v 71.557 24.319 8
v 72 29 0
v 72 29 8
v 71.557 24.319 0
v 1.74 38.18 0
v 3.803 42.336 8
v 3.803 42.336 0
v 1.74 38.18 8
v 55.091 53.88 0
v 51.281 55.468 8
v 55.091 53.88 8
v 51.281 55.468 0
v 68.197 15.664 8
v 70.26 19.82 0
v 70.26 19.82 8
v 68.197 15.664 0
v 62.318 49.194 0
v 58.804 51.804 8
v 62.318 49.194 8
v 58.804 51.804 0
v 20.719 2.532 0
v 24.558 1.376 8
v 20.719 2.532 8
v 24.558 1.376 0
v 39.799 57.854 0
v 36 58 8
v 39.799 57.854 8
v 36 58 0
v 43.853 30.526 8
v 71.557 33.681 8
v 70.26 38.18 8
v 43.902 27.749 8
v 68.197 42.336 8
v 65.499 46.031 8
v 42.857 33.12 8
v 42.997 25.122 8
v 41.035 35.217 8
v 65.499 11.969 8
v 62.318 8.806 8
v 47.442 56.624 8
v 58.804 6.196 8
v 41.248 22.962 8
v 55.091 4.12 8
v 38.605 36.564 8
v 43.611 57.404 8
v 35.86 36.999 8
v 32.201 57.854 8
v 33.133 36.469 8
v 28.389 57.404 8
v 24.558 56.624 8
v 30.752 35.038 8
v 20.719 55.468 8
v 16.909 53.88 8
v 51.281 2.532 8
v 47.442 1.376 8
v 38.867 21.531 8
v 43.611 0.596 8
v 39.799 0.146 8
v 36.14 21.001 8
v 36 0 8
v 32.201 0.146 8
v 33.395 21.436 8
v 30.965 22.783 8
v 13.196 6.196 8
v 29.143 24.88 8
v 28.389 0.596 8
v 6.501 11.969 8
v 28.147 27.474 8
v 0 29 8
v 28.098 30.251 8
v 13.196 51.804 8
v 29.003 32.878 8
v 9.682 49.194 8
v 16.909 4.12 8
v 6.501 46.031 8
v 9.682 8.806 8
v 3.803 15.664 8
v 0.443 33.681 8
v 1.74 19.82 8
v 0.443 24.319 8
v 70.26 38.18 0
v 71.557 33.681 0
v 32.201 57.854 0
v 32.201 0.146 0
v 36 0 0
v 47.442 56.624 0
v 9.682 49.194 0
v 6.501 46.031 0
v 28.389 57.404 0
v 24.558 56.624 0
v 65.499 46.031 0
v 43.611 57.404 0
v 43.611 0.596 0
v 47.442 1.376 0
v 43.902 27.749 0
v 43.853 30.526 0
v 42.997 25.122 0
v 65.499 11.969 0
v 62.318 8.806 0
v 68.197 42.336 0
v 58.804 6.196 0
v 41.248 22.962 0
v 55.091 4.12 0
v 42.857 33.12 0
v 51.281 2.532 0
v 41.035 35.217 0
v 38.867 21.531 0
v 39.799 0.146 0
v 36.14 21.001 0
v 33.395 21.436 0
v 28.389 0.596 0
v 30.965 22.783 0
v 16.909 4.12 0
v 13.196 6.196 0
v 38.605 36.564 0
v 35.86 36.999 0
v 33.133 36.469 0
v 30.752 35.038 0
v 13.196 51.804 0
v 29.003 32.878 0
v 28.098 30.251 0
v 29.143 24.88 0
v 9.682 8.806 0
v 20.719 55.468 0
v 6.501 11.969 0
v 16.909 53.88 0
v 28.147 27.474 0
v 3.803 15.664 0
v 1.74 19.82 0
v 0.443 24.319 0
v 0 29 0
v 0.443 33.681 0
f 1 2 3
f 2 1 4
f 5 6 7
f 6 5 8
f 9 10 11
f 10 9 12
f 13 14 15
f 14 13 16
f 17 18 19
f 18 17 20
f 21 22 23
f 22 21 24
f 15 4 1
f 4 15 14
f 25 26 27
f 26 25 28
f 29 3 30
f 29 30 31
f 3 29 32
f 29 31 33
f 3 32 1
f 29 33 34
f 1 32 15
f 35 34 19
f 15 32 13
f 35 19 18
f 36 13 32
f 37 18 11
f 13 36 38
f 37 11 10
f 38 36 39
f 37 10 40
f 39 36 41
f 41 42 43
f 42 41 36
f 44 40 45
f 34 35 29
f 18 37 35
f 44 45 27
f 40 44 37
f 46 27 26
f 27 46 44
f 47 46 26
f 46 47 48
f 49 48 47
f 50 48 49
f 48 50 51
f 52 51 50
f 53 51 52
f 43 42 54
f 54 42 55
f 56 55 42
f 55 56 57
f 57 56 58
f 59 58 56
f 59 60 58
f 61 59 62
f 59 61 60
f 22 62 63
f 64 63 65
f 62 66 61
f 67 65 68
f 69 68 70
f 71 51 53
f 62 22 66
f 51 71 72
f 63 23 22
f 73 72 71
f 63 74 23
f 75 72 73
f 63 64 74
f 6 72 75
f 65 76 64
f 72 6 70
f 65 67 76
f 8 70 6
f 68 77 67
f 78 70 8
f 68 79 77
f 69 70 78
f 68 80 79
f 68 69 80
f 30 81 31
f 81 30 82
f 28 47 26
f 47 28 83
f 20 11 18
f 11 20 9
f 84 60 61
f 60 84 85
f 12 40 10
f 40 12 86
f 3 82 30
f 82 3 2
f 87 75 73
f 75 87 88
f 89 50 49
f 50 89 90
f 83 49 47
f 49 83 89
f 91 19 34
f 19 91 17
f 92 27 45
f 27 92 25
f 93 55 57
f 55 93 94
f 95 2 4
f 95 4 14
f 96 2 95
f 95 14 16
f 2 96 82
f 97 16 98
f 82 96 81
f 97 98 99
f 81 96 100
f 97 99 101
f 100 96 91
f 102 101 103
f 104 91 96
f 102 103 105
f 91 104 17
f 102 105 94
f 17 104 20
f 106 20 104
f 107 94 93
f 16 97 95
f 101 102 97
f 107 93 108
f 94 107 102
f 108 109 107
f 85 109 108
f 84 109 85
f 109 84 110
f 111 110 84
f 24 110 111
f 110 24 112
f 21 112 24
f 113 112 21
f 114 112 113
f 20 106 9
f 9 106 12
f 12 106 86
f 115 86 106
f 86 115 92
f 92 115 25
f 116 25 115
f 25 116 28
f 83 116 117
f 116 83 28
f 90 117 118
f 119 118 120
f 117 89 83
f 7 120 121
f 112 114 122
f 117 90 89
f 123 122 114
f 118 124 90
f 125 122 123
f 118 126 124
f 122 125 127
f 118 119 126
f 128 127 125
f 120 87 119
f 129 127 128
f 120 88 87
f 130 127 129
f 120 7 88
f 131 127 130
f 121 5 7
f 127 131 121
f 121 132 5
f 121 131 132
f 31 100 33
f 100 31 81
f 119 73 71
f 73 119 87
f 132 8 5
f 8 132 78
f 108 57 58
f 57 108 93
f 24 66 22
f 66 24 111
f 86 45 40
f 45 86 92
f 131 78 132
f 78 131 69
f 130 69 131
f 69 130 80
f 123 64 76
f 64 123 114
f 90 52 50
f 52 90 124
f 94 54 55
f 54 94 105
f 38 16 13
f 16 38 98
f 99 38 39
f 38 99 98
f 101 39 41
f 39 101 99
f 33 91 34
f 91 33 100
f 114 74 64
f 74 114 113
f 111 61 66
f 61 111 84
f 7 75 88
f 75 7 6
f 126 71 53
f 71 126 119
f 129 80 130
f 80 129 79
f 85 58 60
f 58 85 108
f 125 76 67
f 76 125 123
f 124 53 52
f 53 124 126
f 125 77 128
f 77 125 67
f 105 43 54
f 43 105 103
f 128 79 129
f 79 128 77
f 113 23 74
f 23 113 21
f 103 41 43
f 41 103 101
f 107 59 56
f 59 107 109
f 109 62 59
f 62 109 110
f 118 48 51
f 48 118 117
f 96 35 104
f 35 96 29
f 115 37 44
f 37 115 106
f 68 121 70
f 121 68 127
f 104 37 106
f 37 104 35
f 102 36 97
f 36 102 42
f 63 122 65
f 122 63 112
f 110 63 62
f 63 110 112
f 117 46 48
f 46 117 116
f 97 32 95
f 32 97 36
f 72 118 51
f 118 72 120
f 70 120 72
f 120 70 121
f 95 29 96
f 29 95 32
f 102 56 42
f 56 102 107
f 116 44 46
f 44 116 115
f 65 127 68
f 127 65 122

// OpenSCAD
$fn = 32;

// ----------------------------------------------------------------------
// Cam plate: double_lobe cam, base R28
// ----------------------------------------------------------------------

// --- parameters (mm) ---
base_r = 28;              // base circle radius
lobe_h = 8;               // cam lobe rise
bore_r = 8;               // shaft bore radius
plate_t = 8;              // plate thickness, Z (extrusion height)

profile = [[72, 29], [71.557, 33.681], [70.26, 38.18], [68.197, 42.336], [65.499, 46.031], [62.318, 49.194], [58.804, 51.804], [55.091, 53.88], [51.281, 55.468], [47.442, 56.624], [43.611, 57.404], [39.799, 57.854], [36, 58], [32.201, 57.854], [28.389, 57.404], [24.558, 56.624], [20.719, 55.468], [16.909, 53.88], [13.196, 51.804], [9.682, 49.194], [6.501, 46.031], [3.803, 42.336], [1.74, 38.18], [0.443, 33.681], [0, 29], [0.443, 24.319], [1.74, 19.82], [3.803, 15.664], [6.501, 11.969], [9.682, 8.806], [13.196, 6.196], [16.909, 4.12], [20.719, 2.532], [24.558, 1.376], [28.389, 0.596], [32.201, 0.146], [36, 0], [39.799, 0.146], [43.611, 0.596], [47.442, 1.376], [51.281, 2.532], [55.091, 4.12], [58.804, 6.196], [62.318, 8.806], [65.499, 11.969], [68.197, 15.664], [70.26, 19.82], [71.557, 24.319]];  // primary outline, 48 points, counter clockwise
void_1 = [[43.853, 30.526], [42.857, 33.12], [41.035, 35.217], [38.605, 36.564], [35.86, 36.999], [33.133, 36.469], [30.752, 35.038], [29.003, 32.878], [28.098, 30.251], [28.147, 27.474], [29.143, 24.88], [30.965, 22.783], [33.395, 21.436], [36.14, 21.001], [38.867, 21.531], [41.248, 22.962], [42.997, 25.122], [43.902, 27.749]];  // shaft bore, 18 points

// --- the one profile operation ---
difference() {
  linear_extrude(height = plate_t) polygon(points = profile);
  translate([0, 0, -1])
    linear_extrude(height = plate_t + 2) polygon(points = void_1);
}
